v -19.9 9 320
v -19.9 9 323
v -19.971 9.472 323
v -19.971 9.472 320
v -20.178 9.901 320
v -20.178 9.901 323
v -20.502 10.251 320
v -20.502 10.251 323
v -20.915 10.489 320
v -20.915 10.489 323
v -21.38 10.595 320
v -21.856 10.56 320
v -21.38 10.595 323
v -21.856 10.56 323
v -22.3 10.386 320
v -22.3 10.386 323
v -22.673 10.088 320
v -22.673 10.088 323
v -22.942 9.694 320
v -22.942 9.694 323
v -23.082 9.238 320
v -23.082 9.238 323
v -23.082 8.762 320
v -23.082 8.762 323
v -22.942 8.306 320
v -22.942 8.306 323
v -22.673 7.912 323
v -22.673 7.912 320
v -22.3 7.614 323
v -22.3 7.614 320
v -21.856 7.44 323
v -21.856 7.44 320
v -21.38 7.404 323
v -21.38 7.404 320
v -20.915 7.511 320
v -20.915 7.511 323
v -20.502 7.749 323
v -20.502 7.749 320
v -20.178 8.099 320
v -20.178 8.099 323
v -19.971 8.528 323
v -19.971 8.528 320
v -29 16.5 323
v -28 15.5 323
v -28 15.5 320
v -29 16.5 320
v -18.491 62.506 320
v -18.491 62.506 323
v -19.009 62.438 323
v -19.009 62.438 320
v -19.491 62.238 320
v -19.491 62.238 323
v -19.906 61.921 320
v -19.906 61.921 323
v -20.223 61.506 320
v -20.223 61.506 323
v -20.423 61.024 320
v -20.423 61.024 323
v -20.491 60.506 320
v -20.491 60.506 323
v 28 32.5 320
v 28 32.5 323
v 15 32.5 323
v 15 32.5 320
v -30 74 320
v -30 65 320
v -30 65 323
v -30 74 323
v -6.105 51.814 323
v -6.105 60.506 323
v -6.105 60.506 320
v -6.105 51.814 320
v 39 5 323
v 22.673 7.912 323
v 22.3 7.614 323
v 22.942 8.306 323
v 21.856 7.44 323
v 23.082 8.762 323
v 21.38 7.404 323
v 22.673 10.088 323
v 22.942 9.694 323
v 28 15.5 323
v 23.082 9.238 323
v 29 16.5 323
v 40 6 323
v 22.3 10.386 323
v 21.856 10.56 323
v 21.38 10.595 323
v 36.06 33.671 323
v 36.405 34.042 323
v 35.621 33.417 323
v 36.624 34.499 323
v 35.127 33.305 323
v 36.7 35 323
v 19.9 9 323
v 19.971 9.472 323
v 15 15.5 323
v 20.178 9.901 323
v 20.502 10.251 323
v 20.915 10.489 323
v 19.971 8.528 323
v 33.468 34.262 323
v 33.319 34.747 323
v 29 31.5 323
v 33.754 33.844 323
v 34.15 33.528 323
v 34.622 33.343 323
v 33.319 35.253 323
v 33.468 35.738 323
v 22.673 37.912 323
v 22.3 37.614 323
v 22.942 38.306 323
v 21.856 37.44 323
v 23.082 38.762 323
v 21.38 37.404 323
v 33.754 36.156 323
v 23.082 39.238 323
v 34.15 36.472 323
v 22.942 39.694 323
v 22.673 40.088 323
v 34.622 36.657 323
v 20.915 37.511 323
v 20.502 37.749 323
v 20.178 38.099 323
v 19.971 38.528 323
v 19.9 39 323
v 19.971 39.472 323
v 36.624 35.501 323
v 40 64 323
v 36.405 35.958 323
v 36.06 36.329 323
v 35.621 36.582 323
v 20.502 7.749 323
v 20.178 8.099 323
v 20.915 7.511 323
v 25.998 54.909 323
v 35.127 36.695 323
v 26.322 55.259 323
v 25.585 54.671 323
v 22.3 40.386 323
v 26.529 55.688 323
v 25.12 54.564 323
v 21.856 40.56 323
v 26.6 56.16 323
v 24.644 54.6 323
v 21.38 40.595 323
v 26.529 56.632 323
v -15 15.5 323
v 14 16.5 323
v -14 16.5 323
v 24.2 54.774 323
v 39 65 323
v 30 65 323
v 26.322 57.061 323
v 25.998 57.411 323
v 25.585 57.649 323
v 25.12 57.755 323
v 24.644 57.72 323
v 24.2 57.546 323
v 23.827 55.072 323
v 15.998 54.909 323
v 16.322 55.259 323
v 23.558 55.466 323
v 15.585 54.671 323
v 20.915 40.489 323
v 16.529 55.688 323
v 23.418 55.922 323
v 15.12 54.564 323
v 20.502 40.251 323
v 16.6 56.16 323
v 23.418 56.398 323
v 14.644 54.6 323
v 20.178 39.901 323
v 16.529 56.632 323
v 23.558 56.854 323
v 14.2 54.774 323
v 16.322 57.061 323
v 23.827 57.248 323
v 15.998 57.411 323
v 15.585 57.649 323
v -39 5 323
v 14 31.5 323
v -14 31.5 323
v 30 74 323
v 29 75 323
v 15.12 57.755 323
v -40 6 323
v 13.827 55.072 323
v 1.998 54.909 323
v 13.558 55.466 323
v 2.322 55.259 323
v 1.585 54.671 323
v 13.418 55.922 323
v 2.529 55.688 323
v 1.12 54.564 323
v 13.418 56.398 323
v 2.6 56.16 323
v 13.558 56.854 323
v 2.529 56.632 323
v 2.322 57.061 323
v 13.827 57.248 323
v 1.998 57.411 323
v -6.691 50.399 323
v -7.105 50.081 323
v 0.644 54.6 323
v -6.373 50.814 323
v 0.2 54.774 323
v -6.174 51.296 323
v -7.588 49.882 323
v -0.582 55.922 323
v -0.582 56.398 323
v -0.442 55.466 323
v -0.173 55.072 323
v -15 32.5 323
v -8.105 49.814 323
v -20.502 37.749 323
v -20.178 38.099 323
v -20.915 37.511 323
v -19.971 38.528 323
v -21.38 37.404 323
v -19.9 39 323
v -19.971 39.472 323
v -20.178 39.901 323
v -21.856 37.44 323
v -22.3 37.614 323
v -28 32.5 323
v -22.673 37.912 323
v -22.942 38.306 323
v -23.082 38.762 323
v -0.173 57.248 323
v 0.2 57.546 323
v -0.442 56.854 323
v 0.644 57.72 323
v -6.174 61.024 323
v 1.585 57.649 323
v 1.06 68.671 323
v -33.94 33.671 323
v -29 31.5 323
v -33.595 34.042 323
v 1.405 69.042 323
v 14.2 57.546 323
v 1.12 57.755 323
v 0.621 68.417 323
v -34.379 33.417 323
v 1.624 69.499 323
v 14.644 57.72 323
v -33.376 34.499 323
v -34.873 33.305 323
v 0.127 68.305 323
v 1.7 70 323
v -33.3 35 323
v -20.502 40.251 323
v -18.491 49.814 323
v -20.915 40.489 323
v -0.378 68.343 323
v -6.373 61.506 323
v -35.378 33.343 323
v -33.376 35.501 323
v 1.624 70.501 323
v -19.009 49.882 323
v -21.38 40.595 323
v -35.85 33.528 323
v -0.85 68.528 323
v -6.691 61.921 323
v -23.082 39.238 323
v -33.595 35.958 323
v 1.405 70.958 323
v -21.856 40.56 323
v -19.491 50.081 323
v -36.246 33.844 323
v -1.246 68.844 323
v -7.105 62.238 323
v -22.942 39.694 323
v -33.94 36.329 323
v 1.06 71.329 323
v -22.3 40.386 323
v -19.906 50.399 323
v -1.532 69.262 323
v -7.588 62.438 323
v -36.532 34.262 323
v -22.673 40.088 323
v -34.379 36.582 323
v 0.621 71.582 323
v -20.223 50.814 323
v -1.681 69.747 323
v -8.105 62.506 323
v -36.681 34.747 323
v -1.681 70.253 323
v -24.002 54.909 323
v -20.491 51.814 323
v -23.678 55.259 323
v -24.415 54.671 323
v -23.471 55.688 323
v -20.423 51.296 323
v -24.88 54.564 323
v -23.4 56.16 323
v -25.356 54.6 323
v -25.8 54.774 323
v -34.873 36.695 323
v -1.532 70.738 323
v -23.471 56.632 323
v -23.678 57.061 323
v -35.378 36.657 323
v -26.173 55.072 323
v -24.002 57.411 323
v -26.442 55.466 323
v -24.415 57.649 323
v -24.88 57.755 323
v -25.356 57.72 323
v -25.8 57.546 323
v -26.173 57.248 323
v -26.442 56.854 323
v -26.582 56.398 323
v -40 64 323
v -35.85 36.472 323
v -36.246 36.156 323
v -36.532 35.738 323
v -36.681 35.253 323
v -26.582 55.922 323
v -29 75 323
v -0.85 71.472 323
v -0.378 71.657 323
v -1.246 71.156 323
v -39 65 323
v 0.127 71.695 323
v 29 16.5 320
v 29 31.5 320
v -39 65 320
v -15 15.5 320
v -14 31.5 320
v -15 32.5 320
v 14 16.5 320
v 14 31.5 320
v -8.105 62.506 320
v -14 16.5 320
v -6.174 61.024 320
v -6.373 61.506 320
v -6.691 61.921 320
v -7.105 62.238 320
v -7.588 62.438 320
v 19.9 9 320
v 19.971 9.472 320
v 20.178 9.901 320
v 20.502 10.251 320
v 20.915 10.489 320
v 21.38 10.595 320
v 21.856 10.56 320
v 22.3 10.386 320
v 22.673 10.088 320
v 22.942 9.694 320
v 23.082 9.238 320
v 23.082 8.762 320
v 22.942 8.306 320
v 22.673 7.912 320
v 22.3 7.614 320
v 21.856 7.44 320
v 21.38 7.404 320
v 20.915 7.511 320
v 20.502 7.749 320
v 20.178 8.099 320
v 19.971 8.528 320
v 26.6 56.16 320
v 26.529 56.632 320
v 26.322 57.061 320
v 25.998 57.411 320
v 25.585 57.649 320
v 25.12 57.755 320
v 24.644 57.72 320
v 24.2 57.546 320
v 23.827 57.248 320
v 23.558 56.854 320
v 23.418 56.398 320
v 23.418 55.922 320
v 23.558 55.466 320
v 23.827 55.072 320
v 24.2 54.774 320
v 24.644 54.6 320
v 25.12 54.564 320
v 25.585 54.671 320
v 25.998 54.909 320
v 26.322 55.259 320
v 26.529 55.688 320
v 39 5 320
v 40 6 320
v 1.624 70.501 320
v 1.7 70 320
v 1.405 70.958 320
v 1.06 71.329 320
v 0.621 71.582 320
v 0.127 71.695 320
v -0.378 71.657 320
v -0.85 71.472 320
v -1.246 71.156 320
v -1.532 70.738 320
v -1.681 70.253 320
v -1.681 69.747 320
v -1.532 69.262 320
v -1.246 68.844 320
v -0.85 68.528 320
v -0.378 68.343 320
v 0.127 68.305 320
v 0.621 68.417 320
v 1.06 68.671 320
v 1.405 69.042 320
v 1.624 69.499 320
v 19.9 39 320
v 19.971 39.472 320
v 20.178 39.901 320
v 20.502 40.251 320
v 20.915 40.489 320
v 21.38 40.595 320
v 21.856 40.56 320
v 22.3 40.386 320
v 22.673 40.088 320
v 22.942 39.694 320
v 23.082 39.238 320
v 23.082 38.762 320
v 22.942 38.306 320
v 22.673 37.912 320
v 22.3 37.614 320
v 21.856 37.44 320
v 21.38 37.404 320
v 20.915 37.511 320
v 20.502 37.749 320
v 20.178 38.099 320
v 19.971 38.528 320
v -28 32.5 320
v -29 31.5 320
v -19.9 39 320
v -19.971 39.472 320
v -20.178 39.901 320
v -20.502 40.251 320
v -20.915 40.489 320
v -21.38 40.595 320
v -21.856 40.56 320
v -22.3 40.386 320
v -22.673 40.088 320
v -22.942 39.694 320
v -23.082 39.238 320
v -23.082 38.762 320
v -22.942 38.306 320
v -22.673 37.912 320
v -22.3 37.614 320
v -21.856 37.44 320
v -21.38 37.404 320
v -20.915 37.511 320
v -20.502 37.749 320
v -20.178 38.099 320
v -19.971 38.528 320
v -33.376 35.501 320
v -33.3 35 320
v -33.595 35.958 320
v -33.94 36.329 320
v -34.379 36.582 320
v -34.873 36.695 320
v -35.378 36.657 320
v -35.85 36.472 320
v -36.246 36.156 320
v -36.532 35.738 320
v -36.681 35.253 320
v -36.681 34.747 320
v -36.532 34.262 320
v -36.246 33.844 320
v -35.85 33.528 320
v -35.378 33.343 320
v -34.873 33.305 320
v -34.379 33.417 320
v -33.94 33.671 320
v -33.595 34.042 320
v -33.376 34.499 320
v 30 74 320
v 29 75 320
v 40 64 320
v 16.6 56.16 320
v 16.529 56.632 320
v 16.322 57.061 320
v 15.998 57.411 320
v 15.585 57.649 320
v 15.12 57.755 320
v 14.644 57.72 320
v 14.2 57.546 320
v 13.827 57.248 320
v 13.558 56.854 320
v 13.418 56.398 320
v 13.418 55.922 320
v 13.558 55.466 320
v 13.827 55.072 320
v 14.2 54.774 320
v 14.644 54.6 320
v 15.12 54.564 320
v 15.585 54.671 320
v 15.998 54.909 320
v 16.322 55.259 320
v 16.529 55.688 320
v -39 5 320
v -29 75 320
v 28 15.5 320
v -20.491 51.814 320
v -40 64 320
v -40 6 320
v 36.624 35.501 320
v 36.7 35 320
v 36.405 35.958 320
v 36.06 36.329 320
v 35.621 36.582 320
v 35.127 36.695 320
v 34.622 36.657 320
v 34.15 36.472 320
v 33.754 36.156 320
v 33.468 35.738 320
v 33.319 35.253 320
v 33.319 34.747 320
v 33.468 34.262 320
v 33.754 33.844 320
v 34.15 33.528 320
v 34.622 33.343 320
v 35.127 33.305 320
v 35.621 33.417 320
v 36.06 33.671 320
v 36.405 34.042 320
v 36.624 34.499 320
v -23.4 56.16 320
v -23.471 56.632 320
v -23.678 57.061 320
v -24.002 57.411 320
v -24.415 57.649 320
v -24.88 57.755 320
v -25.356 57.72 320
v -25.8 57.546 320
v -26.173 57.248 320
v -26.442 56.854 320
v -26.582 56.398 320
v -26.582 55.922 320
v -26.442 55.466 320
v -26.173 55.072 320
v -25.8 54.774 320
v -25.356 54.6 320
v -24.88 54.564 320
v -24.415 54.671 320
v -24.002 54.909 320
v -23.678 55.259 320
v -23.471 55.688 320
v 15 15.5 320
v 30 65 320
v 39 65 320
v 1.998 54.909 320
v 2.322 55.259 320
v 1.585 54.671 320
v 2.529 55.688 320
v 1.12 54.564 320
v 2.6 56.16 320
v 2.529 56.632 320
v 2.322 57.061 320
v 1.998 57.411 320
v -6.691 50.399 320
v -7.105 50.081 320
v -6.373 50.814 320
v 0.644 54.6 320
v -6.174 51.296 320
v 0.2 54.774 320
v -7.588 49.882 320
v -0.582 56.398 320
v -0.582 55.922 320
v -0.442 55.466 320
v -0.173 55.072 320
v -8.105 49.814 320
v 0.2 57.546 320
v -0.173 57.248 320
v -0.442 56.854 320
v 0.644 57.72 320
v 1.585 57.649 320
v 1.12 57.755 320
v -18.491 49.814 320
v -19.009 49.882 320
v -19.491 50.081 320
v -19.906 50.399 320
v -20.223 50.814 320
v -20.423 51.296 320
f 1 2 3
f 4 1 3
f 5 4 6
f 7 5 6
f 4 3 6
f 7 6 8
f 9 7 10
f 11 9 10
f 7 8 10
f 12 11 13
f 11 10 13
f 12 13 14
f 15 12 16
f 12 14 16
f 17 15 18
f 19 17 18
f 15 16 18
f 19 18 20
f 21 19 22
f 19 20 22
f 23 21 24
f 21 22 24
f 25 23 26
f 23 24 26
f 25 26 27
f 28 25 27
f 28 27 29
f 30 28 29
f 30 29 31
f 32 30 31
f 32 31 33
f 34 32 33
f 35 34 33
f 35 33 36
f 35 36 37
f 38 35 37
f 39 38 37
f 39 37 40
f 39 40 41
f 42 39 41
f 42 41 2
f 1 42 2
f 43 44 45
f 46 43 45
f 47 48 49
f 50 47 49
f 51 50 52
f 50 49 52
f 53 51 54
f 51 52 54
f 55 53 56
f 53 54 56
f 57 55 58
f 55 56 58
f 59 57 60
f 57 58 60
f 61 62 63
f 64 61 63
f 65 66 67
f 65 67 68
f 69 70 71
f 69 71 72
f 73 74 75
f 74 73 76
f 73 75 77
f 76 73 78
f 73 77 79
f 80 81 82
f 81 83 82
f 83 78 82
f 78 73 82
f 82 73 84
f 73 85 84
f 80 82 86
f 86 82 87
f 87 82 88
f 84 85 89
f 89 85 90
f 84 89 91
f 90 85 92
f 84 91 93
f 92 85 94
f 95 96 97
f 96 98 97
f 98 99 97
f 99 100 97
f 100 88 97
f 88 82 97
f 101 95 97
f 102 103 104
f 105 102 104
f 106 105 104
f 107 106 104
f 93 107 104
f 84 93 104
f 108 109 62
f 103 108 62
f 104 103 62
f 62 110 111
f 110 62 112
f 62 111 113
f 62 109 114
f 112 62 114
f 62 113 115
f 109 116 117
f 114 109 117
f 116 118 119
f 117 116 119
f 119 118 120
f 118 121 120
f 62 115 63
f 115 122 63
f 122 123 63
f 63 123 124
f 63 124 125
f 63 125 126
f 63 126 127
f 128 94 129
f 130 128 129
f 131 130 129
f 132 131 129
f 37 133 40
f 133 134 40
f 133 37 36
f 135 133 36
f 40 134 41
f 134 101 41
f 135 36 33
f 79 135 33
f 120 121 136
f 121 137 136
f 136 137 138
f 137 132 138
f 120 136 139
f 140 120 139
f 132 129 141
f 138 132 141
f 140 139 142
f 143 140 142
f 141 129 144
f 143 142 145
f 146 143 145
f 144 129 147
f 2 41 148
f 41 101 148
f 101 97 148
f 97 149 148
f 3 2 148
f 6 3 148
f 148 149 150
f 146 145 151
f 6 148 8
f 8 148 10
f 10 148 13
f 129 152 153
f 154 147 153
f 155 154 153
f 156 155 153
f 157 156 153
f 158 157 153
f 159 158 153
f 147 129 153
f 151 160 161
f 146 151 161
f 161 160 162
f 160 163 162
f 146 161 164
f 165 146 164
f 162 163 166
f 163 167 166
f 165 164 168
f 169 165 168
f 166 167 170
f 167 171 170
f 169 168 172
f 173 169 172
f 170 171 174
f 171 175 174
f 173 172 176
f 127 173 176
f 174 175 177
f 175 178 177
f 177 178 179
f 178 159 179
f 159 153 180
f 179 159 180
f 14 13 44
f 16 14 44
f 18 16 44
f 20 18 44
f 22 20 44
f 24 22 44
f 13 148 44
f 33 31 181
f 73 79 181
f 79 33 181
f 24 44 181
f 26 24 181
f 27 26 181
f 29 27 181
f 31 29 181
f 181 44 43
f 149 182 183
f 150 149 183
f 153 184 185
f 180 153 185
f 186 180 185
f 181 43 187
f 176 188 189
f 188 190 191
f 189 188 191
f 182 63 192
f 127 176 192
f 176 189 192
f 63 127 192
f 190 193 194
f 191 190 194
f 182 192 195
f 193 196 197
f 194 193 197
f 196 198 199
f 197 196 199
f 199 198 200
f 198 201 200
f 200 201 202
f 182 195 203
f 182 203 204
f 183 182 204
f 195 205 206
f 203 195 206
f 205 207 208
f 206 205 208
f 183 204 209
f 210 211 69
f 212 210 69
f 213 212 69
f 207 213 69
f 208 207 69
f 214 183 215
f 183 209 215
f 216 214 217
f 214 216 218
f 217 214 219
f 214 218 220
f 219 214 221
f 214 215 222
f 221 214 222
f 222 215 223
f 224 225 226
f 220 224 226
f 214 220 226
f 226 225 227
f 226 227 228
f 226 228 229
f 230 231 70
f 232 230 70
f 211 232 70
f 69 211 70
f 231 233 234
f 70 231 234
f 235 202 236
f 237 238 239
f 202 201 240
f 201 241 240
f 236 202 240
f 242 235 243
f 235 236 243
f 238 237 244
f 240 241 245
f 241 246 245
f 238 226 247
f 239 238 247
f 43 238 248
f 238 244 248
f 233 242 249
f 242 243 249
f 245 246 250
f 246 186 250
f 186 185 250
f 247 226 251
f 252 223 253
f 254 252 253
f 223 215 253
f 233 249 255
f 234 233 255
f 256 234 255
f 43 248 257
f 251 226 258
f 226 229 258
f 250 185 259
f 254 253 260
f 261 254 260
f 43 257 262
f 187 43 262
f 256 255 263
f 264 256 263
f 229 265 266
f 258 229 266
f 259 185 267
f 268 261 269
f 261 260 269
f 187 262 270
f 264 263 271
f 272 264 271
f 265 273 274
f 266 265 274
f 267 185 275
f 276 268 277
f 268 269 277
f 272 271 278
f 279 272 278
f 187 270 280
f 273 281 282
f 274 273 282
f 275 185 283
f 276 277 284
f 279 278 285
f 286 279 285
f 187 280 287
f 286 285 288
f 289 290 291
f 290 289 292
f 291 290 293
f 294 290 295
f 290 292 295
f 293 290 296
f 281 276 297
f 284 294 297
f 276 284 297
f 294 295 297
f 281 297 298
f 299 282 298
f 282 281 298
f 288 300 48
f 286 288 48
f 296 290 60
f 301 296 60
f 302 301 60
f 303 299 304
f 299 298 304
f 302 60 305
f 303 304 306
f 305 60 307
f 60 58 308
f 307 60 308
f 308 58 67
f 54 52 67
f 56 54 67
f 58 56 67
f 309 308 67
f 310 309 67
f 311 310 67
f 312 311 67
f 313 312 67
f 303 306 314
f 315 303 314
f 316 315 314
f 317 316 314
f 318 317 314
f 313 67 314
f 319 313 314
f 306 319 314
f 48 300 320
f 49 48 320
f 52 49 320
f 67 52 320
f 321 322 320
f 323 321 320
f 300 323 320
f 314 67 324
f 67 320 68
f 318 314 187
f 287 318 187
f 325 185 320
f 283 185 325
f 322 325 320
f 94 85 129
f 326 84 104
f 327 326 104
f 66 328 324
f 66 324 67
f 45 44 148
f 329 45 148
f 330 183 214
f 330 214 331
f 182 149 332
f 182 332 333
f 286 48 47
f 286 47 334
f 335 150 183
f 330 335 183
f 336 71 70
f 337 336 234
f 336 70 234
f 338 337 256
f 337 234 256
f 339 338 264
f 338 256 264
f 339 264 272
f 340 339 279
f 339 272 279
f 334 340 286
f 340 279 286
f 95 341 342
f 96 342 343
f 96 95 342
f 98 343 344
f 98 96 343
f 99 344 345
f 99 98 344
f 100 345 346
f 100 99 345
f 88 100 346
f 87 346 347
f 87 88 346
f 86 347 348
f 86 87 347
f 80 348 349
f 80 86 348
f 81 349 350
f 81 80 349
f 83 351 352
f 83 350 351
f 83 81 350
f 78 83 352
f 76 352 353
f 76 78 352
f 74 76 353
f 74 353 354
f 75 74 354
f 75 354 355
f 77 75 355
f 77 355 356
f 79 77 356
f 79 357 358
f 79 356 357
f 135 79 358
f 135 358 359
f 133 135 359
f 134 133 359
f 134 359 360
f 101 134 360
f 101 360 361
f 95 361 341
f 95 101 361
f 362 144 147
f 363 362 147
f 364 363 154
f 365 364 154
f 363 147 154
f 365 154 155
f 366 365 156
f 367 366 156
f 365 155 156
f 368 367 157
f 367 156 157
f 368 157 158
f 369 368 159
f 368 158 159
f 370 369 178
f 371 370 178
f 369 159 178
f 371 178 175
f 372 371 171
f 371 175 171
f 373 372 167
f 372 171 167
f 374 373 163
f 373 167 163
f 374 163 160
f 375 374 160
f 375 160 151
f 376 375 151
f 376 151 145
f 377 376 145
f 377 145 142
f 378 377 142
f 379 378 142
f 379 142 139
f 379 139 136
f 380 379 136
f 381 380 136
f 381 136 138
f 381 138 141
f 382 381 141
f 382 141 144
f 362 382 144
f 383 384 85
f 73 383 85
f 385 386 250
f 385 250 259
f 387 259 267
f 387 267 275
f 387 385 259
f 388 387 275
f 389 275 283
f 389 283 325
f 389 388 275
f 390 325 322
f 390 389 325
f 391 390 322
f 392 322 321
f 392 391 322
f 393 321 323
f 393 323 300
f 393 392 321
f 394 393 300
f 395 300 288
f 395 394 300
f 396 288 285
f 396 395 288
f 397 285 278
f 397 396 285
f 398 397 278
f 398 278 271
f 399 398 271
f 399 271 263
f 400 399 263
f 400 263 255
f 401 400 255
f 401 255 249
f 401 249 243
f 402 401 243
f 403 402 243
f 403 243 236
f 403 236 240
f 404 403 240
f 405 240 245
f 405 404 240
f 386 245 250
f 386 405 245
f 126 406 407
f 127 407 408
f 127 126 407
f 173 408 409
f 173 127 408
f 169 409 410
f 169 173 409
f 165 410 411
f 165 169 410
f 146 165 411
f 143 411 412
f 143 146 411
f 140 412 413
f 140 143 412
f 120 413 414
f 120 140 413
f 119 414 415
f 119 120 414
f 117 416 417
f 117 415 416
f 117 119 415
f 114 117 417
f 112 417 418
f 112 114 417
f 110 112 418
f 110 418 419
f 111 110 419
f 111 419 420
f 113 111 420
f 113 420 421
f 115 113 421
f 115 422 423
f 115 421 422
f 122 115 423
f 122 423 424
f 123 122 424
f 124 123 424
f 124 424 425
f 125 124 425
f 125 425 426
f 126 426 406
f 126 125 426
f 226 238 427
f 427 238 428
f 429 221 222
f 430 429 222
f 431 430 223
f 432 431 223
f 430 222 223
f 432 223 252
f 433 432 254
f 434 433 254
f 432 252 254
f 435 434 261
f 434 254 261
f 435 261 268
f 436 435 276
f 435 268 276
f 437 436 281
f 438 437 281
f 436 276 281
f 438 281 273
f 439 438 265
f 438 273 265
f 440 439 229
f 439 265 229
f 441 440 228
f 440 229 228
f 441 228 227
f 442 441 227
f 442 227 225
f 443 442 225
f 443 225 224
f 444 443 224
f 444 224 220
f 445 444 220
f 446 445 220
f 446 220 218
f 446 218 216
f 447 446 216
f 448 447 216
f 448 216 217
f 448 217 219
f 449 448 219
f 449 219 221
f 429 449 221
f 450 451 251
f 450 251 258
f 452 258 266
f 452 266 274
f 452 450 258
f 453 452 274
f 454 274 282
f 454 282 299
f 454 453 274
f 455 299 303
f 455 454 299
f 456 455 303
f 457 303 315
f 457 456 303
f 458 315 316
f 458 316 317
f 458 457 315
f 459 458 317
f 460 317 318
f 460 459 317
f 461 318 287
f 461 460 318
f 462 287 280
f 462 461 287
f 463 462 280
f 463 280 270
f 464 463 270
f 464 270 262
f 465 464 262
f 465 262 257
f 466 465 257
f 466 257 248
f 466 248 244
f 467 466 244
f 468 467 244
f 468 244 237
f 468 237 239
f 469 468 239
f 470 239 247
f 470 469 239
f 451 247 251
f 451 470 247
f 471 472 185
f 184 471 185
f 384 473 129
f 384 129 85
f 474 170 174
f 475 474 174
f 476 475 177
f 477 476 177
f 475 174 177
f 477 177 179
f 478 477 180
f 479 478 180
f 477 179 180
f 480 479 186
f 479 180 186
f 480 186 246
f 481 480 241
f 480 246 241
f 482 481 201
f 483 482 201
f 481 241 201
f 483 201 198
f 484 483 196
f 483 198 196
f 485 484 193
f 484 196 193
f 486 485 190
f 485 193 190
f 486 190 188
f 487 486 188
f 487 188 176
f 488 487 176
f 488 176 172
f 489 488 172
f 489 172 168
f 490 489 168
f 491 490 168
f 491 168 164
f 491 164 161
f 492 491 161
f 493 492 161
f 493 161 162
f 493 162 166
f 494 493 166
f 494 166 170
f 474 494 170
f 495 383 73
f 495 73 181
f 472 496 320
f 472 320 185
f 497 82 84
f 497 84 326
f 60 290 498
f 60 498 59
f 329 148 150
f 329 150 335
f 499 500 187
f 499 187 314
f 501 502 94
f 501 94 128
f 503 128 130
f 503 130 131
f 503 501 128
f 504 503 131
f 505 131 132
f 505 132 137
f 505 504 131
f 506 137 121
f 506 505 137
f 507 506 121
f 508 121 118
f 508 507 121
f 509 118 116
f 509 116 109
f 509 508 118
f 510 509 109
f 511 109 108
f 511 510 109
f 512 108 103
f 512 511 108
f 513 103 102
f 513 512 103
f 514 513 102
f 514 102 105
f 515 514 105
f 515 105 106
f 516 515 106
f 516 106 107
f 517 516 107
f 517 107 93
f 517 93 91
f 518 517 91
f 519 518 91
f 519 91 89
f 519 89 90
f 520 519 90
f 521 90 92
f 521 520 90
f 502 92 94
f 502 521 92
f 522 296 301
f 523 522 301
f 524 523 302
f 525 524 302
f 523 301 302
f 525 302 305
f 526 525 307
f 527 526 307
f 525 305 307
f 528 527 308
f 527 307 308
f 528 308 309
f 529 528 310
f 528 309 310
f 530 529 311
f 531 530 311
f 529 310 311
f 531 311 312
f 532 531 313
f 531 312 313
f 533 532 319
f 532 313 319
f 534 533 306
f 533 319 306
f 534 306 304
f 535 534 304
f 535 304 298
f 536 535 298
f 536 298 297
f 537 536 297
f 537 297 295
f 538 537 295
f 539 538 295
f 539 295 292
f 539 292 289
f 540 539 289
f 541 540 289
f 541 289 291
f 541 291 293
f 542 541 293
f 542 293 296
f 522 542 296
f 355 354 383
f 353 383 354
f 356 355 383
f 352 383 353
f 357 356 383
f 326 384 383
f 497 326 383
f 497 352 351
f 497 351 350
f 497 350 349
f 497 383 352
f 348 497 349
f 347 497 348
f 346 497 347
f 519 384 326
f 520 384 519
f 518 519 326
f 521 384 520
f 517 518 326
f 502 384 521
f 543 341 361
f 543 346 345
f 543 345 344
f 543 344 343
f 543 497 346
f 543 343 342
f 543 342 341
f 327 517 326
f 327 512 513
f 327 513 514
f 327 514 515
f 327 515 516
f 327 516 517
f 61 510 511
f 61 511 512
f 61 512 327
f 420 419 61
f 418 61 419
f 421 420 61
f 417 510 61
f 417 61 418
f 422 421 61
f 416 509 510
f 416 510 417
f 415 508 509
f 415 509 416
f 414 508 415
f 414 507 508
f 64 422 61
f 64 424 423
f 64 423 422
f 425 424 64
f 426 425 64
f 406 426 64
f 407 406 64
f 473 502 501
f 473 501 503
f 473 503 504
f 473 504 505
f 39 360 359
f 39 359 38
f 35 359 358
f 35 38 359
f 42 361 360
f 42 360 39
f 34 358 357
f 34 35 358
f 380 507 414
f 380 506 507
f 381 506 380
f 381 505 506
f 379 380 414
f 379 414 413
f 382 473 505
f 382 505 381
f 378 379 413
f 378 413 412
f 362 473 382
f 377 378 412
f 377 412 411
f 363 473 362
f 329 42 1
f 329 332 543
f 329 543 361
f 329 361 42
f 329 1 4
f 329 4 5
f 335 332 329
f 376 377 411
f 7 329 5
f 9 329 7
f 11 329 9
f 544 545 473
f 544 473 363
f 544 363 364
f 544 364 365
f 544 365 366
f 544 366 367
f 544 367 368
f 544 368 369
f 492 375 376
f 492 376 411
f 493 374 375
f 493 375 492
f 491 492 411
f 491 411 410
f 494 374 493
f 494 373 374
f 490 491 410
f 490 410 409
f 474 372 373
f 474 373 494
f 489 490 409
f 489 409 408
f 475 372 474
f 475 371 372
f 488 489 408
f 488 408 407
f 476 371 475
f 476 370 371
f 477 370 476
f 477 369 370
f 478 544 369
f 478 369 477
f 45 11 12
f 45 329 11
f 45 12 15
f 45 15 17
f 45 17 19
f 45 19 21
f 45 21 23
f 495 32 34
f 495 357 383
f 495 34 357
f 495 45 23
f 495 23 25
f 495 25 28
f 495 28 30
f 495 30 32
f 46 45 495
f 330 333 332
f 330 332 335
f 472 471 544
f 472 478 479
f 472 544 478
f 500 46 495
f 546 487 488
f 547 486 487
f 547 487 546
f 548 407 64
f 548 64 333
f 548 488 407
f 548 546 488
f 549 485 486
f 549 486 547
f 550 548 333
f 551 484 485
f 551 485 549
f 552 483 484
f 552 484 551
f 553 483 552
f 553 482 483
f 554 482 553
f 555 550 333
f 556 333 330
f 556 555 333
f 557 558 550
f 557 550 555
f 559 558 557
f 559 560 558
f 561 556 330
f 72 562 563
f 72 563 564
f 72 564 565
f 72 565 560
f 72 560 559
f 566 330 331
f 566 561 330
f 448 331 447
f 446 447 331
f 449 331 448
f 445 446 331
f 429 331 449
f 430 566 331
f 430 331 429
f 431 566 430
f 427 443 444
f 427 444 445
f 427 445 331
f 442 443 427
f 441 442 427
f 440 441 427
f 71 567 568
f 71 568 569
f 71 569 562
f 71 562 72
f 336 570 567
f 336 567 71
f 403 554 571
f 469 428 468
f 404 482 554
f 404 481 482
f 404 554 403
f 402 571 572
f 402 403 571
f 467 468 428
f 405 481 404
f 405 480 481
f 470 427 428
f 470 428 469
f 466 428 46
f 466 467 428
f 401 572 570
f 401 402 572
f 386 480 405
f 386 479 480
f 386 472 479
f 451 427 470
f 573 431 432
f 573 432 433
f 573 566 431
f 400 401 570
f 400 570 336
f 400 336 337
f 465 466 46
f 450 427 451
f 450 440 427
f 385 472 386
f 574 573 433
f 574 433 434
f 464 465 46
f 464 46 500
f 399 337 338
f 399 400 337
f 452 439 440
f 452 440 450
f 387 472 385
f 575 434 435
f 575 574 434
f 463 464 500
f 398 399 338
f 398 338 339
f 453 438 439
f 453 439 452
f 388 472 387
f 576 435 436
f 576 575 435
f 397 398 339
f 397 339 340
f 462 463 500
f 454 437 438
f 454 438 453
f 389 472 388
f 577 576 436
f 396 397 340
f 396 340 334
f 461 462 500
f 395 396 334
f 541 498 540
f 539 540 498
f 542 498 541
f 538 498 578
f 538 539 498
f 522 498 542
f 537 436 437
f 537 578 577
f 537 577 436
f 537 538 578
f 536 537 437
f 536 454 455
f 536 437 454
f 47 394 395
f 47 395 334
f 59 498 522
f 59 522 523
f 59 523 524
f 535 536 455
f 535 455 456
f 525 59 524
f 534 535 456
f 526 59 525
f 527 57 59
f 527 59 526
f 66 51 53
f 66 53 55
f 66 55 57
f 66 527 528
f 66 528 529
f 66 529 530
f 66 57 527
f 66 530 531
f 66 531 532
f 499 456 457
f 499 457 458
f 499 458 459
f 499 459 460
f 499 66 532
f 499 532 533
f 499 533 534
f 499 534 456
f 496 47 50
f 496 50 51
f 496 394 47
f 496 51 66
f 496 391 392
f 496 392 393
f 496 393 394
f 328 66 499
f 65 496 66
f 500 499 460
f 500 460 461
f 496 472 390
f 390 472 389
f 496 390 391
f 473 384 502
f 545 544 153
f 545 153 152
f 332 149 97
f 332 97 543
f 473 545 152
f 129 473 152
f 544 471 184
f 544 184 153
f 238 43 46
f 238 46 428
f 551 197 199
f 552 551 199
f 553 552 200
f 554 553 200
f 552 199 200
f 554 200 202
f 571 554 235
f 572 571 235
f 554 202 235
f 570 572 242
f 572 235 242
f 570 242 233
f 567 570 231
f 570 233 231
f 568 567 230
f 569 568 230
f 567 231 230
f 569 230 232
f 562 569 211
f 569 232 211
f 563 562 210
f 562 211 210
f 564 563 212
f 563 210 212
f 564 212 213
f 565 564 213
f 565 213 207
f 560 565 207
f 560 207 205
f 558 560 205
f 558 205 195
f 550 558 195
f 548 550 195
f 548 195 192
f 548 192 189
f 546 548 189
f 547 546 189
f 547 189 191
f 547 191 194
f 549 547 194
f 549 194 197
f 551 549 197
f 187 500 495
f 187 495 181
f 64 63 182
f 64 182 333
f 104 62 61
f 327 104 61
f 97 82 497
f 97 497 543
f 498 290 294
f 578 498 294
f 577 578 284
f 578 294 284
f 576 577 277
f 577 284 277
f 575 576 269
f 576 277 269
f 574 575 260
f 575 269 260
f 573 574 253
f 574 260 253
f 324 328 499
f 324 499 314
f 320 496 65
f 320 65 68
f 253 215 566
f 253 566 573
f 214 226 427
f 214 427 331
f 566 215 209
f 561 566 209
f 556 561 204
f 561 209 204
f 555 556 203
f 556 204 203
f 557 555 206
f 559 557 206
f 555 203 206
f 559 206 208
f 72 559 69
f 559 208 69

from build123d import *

# Parameters (mm, degrees)
SKETCH152_R     = 1.7
PAD084_DEPTH    = 3
CHAMFER055_SIZE = 1
SKETCH154_R     = 1.6
SKETCH154_W     = 15
SKETCH154_H     = 17
POCKET_DEPTH    = 215.688564
CHAMFER057_SIZE = 1
SKETCH178_R     = 1.6
POCKET024_DEPTH = 3.001


with BuildPart() as part:
    # Sketch152 → Pad084 (new body)
    with BuildSketch(Plane.XY):
        Polygon((40, -30), (-40, -30), (-40, 30), (-30, 30), (-30, 40), (30, 40), (30, 30), (40, 30), align=None)
        with Locations((0, 35)):
            Circle(SKETCH152_R, mode=Mode.SUBTRACT)
        with Locations((-35, 0)):
            Circle(SKETCH152_R, mode=Mode.SUBTRACT)
        with Locations((35, 0)):
            Circle(SKETCH152_R, mode=Mode.SUBTRACT)
    extrude(amount=PAD084_DEPTH)

    # Chamfer055
    chamfer055_edges = [part.edges().sort_by_distance(p)[0] for p in [
        (40, 30, 1.5),
        (30, 40, 1.5),
        (-30, 40, 1.5),
        (-40, 30, 1.5),
        (-40, -30, 1.5),
        (40, -30, 1.5),
    ]]
    chamfer(chamfer055_edges, length=CHAMFER055_SIZE)


with BuildPart() as part_1:
    # Body072 placement: moved
    add(part.part.moved(Location((0, 34.999969, 320.000031))))

    # Sketch154 (on Face5 of Clone) → Pocket (cut, through all)
    with BuildSketch(Plane(origin=(0, 34.999969, 323.000031), x_dir=(1, 0, 0), z_dir=(0, 0, 1))):
        with Locations((-21.5, -26)):
            Circle(SKETCH154_R)
        with Locations((-21.5, 4)):
            Circle(SKETCH154_R)
        with Locations((-21.5, -11)):
            Rectangle(SKETCH154_W, SKETCH154_H)
    pocket = extrude(amount=-POCKET_DEPTH, mode=Mode.SUBTRACT)

    # Mirrored: Pocket across Sketch154 V_Axis
    add(pocket.mirror(Plane(origin=(0, 34.999969, 323.000031), x_dir=(0, 0, 1), z_dir=(1, 0, 0))), mode=Mode.SUBTRACT)

    # Chamfer057
    chamfer057_edges = [part_1.edges().sort_by_distance(p)[0] for p in [
        (29, 15.499969, 321.500031),
        (29, 32.499969, 321.500031),
        (14, 32.499969, 321.500031),
        (14, 15.499969, 321.500031),
        (-14, 15.499969, 321.500031),
        (-29, 15.499969, 321.500031),
        (-29, 32.499969, 321.500031),
        (-14, 32.499969, 321.500031),
    ]]
    chamfer(chamfer057_edges, length=CHAMFER057_SIZE)

    # Sketch178 (on Face39 of Chamfer057) → Pocket024 (cut, through all)
    with BuildSketch(Plane(origin=(0, 34.999969, 323.000031), x_dir=(1, 0, 0), z_dir=(0, 0, 1))):
        with Locations((-25, 21.16)):
            Circle(SKETCH178_R)
        with Locations((25, 21.16)):
            Circle(SKETCH178_R)
        with Locations((15, 21.16)):
            Circle(SKETCH178_R)
        with Locations((1, 21.16)):
            Circle(SKETCH178_R)
        with BuildLine():
            ThreePointArc((-18.491423, 27.506442), (-19.905637, 26.920655), (-20.491423, 25.506442))
            Line((-20.491423, 16.813558), (-20.491423, 25.506442))
            ThreePointArc((-20.491423, 16.813558), (-19.905637, 15.399345), (-18.491423, 14.813558))
            Line((-8.105475, 14.813558), (-18.491423, 14.813558))
            ThreePointArc((-8.105475, 14.813558), (-6.691261, 15.399345), (-6.105475, 16.813558))
            Line((-6.105475, 25.506442), (-6.105475, 16.813558))
            ThreePointArc((-6.105475, 25.506442), (-6.691261, 26.920655), (-8.105475, 27.506442))
            Line((-18.491423, 27.506442), (-8.105475, 27.506442))
        make_face()
    extrude(amount=-POCKET024_DEPTH, mode=Mode.SUBTRACT)


solid = part_1.part
